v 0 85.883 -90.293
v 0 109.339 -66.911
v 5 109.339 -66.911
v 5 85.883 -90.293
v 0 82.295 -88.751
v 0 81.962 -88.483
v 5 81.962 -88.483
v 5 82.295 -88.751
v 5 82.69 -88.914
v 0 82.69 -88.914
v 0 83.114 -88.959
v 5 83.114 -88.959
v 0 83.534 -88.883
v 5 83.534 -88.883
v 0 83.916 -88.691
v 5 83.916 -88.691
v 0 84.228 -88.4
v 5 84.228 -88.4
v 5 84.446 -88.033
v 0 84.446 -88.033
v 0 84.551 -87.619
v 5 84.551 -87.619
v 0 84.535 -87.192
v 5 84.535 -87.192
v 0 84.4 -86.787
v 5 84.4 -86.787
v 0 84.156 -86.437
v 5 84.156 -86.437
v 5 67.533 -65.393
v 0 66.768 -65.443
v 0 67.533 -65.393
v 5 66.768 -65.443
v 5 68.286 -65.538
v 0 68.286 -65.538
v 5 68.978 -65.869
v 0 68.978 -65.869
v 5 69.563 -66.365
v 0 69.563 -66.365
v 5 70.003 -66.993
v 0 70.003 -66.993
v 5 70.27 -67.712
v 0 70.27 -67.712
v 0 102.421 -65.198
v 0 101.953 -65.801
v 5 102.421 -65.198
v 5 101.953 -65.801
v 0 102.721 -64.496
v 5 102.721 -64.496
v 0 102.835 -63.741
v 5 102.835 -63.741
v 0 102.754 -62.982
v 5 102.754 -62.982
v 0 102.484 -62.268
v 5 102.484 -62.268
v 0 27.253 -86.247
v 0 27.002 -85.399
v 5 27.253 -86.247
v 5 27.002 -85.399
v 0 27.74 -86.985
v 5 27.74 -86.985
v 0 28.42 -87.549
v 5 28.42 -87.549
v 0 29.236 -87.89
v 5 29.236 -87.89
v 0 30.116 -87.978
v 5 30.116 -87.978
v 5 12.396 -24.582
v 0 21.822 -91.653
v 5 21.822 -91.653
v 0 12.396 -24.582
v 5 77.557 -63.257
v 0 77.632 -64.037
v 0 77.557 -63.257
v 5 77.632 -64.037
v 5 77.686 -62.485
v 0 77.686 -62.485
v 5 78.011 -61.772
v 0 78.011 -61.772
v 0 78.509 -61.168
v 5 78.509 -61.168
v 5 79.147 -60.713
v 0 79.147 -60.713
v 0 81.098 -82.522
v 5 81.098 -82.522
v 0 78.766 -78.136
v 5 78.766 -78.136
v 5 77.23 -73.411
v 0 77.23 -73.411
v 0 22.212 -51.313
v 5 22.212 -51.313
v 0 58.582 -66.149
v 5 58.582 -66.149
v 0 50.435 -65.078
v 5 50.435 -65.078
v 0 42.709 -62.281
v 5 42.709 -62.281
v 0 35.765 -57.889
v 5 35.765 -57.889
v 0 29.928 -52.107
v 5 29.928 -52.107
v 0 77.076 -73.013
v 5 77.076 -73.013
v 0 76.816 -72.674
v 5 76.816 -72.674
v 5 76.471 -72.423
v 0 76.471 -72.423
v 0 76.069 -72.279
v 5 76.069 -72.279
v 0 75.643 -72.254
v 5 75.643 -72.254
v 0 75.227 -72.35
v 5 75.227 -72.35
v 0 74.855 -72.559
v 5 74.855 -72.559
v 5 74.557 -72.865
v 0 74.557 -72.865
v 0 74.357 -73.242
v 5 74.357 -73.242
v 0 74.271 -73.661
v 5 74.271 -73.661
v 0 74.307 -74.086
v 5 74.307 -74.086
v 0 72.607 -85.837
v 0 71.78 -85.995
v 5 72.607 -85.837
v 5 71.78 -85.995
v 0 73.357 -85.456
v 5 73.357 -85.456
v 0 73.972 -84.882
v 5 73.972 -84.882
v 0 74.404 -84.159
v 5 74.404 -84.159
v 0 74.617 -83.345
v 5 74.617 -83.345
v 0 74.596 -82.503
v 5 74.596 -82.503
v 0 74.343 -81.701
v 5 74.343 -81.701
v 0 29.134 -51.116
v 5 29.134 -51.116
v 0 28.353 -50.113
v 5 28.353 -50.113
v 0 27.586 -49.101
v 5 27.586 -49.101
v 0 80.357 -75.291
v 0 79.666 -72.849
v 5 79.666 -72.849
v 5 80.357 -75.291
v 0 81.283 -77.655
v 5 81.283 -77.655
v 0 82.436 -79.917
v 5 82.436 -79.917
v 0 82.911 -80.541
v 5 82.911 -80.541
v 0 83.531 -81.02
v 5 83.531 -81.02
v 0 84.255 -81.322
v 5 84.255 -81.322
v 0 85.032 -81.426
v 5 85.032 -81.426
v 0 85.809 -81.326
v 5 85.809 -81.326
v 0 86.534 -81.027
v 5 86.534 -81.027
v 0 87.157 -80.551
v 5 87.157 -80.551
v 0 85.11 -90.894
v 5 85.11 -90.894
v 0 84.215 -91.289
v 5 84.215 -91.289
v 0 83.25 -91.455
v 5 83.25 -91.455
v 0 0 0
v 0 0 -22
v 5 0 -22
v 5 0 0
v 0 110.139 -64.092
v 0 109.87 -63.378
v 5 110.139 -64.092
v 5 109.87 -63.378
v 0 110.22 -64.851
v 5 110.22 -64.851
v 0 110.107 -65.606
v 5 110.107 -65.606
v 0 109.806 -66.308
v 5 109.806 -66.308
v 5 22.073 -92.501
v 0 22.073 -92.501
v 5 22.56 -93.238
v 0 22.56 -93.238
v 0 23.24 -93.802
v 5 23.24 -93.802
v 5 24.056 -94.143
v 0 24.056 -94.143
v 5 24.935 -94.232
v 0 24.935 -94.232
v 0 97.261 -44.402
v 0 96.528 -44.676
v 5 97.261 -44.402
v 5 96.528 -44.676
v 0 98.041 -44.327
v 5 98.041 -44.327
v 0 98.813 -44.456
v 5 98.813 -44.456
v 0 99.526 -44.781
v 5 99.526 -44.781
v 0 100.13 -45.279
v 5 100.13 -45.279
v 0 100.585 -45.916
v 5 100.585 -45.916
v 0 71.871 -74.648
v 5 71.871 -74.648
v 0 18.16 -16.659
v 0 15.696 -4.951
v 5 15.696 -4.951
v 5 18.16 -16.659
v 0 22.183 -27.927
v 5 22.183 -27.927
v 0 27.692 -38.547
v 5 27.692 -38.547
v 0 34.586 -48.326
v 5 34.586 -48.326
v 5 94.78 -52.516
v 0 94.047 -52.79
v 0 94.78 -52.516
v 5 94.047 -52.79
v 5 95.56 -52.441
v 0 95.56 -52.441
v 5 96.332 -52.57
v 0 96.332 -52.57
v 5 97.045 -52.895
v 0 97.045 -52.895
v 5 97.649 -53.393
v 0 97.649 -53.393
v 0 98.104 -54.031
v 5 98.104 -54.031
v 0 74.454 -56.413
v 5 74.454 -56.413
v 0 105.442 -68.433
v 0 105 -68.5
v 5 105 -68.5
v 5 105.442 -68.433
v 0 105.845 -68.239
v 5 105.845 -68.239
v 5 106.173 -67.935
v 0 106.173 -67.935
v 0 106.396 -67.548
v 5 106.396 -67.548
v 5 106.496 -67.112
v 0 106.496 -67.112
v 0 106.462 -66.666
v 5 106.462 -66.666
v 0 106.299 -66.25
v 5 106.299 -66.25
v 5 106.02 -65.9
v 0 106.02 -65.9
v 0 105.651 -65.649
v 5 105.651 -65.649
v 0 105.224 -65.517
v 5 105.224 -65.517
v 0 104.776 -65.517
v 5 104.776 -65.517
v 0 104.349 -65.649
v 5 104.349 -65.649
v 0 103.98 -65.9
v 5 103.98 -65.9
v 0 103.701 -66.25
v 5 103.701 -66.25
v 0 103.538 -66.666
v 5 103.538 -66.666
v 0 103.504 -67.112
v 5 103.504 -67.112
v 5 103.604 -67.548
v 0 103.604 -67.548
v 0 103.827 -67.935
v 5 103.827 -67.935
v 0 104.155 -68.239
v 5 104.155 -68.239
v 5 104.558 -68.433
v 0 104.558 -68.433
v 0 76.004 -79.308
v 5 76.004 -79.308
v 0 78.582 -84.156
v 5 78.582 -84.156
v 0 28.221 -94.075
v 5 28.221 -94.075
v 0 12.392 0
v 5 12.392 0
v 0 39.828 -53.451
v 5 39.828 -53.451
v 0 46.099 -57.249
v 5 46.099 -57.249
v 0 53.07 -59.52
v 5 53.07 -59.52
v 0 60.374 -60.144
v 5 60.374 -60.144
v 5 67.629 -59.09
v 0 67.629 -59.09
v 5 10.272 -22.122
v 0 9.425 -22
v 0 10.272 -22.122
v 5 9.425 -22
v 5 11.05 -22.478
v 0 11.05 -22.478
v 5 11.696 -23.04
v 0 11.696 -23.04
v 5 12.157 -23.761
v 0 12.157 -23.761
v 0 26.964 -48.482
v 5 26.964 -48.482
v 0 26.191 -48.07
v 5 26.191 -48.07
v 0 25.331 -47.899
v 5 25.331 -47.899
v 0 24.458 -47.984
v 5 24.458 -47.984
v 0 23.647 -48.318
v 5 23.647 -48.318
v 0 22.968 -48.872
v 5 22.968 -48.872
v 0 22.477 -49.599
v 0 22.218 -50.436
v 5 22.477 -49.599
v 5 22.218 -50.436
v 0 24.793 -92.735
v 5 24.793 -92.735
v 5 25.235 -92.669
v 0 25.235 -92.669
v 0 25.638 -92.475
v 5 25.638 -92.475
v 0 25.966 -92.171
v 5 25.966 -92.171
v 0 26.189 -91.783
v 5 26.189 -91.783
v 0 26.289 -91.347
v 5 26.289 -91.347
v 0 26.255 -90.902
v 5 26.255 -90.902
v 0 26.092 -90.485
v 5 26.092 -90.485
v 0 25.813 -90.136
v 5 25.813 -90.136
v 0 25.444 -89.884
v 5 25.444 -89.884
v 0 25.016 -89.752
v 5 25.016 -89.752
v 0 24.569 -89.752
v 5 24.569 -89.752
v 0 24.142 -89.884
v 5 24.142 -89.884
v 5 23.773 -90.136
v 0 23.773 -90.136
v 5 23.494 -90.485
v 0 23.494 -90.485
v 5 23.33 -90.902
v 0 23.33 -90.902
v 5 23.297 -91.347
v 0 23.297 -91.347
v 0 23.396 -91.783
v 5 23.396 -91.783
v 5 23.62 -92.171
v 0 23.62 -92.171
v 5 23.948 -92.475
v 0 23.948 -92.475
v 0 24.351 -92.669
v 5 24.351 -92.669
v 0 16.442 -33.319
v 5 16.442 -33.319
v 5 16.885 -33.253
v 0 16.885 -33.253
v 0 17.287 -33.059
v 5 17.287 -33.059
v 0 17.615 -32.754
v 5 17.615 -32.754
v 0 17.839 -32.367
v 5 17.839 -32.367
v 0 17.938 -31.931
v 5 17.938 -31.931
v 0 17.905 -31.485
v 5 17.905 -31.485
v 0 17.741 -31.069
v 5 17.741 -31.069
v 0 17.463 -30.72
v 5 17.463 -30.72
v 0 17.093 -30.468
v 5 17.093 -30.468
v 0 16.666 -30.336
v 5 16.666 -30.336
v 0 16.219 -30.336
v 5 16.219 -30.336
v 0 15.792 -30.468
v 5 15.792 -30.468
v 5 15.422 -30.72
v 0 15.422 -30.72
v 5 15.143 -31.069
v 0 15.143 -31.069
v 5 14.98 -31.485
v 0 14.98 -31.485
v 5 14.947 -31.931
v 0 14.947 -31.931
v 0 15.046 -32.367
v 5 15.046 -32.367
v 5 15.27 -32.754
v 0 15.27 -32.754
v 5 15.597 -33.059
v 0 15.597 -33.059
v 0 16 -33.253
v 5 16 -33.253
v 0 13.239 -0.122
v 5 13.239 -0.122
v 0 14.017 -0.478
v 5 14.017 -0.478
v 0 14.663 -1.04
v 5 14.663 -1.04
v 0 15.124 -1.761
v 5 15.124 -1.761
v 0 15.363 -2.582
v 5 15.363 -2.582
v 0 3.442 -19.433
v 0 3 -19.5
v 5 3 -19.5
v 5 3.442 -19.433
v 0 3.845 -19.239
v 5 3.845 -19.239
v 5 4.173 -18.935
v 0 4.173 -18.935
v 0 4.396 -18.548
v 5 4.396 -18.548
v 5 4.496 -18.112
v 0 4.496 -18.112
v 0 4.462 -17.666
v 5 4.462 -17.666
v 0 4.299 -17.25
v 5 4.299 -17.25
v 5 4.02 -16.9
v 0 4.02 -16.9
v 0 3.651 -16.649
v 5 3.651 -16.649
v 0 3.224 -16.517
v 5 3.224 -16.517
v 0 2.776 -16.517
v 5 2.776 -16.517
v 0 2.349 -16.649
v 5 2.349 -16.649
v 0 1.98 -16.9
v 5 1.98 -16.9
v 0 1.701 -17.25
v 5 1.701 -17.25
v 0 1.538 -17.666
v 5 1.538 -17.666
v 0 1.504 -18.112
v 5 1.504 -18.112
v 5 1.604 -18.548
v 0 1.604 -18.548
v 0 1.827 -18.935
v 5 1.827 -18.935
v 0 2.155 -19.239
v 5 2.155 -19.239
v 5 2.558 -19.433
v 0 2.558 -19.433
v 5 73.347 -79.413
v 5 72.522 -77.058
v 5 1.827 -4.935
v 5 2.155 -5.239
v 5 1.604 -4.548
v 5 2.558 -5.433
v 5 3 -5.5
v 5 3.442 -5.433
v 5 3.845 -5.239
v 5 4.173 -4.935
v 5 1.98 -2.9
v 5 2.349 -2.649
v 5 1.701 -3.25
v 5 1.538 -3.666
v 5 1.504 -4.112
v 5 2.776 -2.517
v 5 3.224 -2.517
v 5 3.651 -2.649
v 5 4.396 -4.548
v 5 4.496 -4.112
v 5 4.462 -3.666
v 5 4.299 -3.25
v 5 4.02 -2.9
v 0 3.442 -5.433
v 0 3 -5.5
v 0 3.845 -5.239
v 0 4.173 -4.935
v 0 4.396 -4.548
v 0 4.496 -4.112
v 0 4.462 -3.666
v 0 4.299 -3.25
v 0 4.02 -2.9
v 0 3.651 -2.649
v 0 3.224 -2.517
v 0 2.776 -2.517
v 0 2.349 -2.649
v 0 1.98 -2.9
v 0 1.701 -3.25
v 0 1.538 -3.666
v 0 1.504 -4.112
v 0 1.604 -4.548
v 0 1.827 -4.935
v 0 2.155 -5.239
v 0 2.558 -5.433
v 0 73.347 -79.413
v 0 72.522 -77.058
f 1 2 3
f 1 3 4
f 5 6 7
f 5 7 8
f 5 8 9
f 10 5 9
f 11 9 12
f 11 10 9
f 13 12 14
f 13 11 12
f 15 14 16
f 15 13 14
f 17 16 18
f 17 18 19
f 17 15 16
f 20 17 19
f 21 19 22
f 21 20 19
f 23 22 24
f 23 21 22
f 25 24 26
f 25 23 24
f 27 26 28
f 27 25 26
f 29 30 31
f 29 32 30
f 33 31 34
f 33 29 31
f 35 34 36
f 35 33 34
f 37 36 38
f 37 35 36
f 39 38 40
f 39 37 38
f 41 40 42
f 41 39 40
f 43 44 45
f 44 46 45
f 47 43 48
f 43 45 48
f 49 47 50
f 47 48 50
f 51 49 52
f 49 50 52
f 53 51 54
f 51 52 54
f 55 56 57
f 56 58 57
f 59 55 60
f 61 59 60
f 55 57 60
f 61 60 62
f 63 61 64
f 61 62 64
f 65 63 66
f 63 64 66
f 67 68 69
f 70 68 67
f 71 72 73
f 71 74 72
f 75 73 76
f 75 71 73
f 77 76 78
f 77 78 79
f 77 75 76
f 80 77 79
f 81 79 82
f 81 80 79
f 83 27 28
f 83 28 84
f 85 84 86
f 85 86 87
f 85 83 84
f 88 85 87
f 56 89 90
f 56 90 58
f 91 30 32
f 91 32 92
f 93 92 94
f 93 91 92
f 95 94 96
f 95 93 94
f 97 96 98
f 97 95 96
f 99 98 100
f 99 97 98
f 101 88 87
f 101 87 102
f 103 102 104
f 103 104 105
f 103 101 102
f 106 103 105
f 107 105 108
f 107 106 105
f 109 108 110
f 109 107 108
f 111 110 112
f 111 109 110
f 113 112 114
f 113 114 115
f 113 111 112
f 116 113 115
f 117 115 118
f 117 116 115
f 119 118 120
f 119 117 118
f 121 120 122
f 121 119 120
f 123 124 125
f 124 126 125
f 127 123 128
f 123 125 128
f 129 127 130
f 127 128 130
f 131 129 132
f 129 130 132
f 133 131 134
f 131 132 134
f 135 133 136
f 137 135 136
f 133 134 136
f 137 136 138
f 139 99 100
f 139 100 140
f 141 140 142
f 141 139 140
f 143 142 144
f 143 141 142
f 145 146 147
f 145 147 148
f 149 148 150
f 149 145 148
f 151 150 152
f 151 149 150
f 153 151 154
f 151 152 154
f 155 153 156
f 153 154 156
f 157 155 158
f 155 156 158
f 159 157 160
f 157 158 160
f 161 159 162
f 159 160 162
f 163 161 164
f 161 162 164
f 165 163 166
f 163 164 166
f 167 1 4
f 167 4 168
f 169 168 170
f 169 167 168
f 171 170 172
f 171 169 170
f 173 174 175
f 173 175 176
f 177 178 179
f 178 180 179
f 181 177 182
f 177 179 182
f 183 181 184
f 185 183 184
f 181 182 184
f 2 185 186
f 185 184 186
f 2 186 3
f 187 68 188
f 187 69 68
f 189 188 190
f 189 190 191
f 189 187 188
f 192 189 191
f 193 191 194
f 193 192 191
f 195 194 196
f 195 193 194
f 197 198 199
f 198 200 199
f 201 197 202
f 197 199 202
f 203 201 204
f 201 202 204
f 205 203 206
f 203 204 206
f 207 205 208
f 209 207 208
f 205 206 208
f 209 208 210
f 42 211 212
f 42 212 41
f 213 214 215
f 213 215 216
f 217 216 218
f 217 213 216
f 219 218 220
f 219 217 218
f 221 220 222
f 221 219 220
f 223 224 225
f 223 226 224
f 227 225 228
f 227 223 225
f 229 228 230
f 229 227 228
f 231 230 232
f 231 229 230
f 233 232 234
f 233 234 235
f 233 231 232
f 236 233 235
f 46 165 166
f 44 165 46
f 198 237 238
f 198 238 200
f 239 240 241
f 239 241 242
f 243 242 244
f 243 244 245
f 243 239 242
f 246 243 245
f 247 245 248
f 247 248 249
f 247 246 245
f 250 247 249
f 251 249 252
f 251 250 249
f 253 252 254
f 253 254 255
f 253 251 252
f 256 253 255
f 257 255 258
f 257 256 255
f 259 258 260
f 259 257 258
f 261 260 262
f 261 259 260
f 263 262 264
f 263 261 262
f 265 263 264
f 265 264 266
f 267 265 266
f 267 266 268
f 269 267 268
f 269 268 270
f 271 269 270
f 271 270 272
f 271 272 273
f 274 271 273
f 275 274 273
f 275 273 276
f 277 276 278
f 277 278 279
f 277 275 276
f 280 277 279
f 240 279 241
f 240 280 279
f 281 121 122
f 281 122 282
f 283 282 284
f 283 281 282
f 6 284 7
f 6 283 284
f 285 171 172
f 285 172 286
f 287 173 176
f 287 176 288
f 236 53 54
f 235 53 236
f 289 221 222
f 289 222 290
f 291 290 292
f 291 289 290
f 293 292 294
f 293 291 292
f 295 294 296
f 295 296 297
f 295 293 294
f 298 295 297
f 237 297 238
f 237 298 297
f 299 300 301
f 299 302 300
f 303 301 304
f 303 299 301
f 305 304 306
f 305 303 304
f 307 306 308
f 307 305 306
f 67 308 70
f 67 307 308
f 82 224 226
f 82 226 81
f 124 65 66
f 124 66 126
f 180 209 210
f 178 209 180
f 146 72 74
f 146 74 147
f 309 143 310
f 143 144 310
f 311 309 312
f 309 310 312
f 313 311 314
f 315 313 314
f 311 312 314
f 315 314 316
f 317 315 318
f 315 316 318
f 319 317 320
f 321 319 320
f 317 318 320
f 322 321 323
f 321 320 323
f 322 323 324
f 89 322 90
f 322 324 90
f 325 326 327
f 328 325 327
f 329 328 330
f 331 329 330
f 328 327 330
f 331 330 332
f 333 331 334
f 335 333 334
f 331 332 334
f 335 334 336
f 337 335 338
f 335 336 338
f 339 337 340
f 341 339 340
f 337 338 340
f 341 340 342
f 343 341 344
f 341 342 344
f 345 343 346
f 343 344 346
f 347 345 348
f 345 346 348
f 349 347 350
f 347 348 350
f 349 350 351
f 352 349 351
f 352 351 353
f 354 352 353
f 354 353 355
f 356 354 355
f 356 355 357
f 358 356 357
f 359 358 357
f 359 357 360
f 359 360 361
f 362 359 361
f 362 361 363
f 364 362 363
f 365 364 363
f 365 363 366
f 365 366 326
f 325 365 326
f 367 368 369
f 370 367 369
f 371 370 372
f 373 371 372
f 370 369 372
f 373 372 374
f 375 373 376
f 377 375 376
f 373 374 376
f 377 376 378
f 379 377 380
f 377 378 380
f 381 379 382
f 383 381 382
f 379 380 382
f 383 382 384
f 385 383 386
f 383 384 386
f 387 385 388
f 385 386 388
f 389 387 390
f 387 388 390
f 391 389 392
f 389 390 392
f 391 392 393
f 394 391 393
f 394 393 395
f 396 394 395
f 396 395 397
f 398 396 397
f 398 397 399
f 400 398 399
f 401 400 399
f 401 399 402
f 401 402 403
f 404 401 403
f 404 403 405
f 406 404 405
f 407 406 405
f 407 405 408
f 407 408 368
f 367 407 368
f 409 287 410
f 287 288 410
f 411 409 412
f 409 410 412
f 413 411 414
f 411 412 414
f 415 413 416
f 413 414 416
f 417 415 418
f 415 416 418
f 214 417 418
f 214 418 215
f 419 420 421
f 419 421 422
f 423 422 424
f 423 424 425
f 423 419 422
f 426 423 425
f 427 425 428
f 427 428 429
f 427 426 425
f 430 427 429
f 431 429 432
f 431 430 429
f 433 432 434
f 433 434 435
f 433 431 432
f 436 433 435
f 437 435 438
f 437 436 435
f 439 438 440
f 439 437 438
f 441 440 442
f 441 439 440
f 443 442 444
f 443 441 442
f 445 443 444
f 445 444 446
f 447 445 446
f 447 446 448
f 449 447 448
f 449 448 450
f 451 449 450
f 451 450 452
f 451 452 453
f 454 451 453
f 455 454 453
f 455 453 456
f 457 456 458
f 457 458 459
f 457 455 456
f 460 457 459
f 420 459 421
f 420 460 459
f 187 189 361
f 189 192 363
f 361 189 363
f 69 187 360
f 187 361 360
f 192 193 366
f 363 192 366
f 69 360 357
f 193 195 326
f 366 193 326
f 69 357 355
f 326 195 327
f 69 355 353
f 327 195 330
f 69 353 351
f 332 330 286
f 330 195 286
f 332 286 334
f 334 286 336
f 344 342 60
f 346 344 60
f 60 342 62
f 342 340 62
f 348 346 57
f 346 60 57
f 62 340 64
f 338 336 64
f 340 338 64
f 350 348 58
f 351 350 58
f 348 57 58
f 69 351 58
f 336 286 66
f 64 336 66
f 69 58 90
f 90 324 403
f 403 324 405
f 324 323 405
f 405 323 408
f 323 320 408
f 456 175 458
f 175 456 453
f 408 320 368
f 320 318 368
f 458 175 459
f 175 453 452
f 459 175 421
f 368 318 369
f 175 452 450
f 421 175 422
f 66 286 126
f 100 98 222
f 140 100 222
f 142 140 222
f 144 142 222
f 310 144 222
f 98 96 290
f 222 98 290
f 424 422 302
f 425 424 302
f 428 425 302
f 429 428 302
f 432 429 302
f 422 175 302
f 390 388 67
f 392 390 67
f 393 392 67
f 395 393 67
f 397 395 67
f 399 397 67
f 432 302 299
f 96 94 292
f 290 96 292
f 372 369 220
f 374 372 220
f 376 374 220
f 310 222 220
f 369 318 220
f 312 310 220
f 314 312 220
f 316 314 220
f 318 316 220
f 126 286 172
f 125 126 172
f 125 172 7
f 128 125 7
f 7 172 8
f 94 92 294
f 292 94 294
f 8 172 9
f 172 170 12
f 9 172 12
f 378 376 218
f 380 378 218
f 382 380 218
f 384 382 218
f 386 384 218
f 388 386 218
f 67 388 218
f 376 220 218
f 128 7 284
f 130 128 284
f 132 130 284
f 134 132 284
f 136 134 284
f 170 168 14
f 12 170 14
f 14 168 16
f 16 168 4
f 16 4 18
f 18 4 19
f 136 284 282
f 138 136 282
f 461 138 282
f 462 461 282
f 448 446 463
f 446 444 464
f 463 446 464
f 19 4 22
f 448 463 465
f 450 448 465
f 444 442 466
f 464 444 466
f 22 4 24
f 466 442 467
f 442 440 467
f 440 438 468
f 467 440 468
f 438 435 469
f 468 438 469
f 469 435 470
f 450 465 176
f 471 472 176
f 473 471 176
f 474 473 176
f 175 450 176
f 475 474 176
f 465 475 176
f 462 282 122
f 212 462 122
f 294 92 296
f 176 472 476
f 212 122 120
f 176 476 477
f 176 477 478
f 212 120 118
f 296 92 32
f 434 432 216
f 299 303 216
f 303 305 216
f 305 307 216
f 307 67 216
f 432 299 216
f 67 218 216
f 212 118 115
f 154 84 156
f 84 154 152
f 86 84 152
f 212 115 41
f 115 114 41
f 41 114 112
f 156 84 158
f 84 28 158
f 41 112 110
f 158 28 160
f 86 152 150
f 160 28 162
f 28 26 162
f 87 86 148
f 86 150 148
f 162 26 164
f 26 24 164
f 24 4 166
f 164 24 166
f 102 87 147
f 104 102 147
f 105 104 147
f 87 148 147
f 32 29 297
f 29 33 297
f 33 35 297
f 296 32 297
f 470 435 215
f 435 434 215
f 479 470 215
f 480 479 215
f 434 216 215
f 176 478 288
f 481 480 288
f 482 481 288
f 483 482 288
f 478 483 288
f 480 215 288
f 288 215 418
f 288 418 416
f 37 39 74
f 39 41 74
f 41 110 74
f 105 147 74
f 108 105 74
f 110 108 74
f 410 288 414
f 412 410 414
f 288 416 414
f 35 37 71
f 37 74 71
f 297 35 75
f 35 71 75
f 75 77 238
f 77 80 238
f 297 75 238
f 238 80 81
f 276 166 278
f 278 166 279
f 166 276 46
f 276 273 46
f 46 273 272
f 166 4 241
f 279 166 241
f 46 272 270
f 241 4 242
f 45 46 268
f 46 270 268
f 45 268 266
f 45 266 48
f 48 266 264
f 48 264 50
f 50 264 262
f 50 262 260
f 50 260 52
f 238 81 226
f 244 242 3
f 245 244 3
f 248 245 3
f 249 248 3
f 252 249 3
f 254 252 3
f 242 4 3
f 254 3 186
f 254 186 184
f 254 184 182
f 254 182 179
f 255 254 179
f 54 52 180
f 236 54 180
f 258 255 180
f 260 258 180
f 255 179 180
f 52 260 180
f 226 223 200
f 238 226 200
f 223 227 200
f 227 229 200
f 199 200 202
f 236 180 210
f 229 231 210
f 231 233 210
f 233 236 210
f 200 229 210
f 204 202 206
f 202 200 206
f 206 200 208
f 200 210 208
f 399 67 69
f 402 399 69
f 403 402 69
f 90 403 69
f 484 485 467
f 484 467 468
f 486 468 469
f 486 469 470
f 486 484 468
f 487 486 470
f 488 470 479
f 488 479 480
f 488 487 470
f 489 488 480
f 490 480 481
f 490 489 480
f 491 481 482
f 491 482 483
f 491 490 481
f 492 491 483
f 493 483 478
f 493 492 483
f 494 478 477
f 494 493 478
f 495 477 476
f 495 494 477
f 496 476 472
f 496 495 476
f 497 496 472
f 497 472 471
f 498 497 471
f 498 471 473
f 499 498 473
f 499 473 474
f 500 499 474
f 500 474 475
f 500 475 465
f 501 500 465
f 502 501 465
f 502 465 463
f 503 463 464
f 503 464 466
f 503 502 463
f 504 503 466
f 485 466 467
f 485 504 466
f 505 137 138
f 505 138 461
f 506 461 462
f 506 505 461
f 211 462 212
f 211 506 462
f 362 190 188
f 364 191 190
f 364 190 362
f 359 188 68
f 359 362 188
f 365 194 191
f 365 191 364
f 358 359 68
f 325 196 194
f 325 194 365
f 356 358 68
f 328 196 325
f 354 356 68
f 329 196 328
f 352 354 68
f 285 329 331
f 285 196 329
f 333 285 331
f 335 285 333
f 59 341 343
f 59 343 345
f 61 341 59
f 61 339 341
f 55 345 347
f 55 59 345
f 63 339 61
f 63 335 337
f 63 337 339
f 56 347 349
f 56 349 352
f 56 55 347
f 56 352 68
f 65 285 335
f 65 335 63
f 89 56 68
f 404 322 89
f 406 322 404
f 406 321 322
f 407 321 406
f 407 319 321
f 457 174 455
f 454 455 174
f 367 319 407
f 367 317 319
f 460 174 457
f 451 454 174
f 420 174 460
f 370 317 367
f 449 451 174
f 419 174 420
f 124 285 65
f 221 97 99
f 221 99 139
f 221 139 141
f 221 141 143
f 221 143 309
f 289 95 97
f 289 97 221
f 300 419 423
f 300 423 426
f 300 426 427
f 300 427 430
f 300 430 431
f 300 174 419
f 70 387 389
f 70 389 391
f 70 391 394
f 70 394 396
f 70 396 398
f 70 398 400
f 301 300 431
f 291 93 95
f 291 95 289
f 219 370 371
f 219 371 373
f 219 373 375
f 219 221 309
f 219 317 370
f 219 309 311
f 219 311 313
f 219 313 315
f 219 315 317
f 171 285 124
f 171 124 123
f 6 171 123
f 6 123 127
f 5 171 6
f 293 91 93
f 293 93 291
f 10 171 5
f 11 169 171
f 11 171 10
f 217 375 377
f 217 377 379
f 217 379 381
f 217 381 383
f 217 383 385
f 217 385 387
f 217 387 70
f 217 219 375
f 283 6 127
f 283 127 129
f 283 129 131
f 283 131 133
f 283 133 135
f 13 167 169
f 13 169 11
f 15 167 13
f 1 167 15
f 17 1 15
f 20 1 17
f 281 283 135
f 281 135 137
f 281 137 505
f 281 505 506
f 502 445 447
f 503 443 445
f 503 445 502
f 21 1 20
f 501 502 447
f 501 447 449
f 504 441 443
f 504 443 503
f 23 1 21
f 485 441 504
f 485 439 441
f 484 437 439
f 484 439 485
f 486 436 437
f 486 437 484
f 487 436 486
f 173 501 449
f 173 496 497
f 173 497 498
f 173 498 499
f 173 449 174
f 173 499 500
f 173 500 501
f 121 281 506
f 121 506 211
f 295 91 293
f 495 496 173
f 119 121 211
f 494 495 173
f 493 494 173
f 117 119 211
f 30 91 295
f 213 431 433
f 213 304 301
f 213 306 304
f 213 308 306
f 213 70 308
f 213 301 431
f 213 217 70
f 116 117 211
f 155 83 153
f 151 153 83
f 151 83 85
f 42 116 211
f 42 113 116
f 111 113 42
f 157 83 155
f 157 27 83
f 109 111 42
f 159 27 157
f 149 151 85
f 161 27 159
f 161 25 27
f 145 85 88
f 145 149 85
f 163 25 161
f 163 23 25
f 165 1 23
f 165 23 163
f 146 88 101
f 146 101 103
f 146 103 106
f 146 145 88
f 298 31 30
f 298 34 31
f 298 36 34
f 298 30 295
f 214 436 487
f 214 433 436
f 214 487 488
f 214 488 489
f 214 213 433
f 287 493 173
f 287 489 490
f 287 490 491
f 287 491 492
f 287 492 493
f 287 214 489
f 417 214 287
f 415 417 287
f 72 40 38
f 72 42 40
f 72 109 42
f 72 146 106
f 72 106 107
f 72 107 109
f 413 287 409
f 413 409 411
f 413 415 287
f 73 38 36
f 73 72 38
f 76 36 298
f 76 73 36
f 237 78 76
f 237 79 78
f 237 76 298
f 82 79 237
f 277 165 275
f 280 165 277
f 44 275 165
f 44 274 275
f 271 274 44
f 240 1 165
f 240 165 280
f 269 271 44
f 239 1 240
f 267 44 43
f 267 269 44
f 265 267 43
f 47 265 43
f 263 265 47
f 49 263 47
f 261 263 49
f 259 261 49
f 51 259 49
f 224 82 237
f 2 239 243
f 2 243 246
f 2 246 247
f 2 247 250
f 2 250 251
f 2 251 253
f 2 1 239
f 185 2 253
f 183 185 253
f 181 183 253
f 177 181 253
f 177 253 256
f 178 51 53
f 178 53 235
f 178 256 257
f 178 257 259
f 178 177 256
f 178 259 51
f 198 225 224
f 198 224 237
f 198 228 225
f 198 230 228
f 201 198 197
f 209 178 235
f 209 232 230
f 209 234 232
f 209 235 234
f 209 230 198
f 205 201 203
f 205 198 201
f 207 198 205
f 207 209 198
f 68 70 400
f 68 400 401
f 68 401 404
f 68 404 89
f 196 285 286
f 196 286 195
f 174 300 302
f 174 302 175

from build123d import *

# Parameters (mm, degrees)
SKETCH1_R           = 1.5
BOSS_EXTRUDE1_DEPTH = 5
FILLET1_R           = 3
CUT_EXTRUDE2_REACH  = 7
SKETCH7_R           = 1.5


with BuildPart() as part:
    # Sketch1 → Boss-Extrude1 (new body)
    with BuildSketch(Plane(origin=(0, 0, 0), x_dir=(0, 0, -1), z_dir=(1, 0, 0))):
        with BuildLine():
            Line((0, 0), (0, 15))
            Line((0, 15), (4.951340344, 15.695865505))
            ThreePointArc((4.951340344, 15.695865505), (27.926864621, 22.182944056), (48.325875811, 34.586058439))
            ThreePointArc((48.325875811, 34.586058439), (59.519665724, 53.069681974), (56.412643103, 74.454061366))
            Line((56.412643103, 74.454061366), (43.267439345, 99.176593966))
            Line((43.267439345, 99.176593966), (65.341129166, 110.913383036))
            Line((65.341129166, 110.913383036), (90.292806812, 85.883380245))
            ThreePointArc((90.292806812, 85.883380245), (91.119279883, 84.674725039), (91.455424552, 83.249624372))
            Line((91.455424552, 83.249624372), (94.07546653, 28.221444591))
            Line((94.07546653, 28.221444591), (94.36203286, 22.202753427))
            Line((94.36203286, 22.202753427), (22, 12.032932928))
            Line((22, 12.032932928), (22, 0))
            Line((22, 0), (0, 0))
        make_face()
        with Locations((4, 3)):
            Circle(SKETCH1_R, mode=Mode.SUBTRACT)
        with Locations((18, 3)):
            Circle(SKETCH1_R, mode=Mode.SUBTRACT)
        with Locations((67, 105)):
            Circle(SKETCH1_R, mode=Mode.SUBTRACT)
        with BuildLine():
            Line((37.734060935, 20.303176421), (88.108596969, 27.382855762))
            Line((88.108596969, 27.382855762), (85.763043155, 76.646019476))
            ThreePointArc((85.763043155, 76.646019476), (80.419740702, 73.76043279), (74.648335848, 71.871417797))
            Line((74.648335848, 71.871417797), (64.774649495, 69.591897689))
            ThreePointArc((64.774649495, 69.591897689), (64.35710923, 47.870362906), (52.107292501, 29.927637267))
            ThreePointArc((52.107292501, 29.927637267), (45.141760841, 24.785238396), (37.734060935, 20.303176421))
        make_face(mode=Mode.SUBTRACT)
        with BuildLine():
            Line((83.108700039, 84.591428686), (64.231449963, 103.527935833))
            Line((64.231449963, 103.527935833), (51.381954278, 96.695737786))
            Line((51.381954278, 96.695737786), (61.793684809, 77.114120627))
            Line((61.793684809, 77.114120627), (72.848727413, 79.666378316))
            ThreePointArc((72.848727413, 79.666378316), (78.251497028, 81.560635362), (83.108700039, 84.591428686))
        make_face(mode=Mode.SUBTRACT)
        with BuildLine():
            ThreePointArc((74.085958212, 74.307342959), (81.788354228, 77.187150825), (88.482948342, 81.962358399))
            ThreePointArc((88.482948342, 81.962358399), (88.556981354, 84.082386492), (86.436953262, 84.156419504))
            ThreePointArc((86.436953262, 84.156419504), (80.379939539, 79.835993604), (73.411105049, 77.230453154))
            ThreePointArc((73.411105049, 77.230453154), (72.286976533, 75.431471475), (74.085958212, 74.307342959))
        make_face(mode=Mode.SUBTRACT)
    extrude(amount=BOSS_EXTRUDE1_DEPTH)

    # Fillet1
    fillet1_edges = [part.edges().sort_by_distance(p)[0] for p in [
        (2.5, 15, 0),
        (2.5, 99.176593966, -43.267439345),
        (2.5, 110.913383036, -65.341129166),
        (2.5, 22.202753427, -94.36203286),
        (2.5, 12.032932928, -22),
        (2.5, 20.303176421, -37.734060935),
        (2.5, 27.382855762, -88.108596969),
        (2.5, 76.646019476, -85.763043155),
        (2.5, 69.591897689, -64.774649495),
        (2.5, 84.591428686, -83.108700039),
        (2.5, 103.527935833, -64.231449963),
        (2.5, 96.695737786, -51.381954278),
        (2.5, 77.114120627, -61.793684809),
    ]]
    fillet(fillet1_edges, radius=FILLET1_R)

    # Sketch7 → Cut-Extrude2 (cut, up to next)
    with BuildSketch(Plane(origin=(5, 0, 0), x_dir=(0, 0, -1), z_dir=(1, 0, 0)), mode=Mode.PRIVATE) as cut_extrude2_sk1:
        with Locations((31.81923079, 16.442418537)):
            Circle(SKETCH7_R)
    cut_extrude2_tool1 = extrude(cut_extrude2_sk1.sketch, amount=-CUT_EXTRUDE2_REACH, mode=Mode.PRIVATE) & part.part
    add(cut_extrude2_tool1.solids().sort_by_distance((5, 16.442419, -31.819231))[0], mode=Mode.SUBTRACT)
    # Sketch7 → Cut-Extrude2 (cut, up to next)
    with BuildSketch(Plane(origin=(5, 0, 0), x_dir=(0, 0, -1), z_dir=(1, 0, 0)), mode=Mode.PRIVATE) as cut_extrude2_sk2:
        with Locations((91.235314915, 24.792804595)):
            Circle(SKETCH7_R)
    cut_extrude2_tool2 = extrude(cut_extrude2_sk2.sketch, amount=-CUT_EXTRUDE2_REACH, mode=Mode.PRIVATE) & part.part
    add(cut_extrude2_tool2.solids().sort_by_distance((5, 24.792805, -91.235315))[0], mode=Mode.SUBTRACT)


solid = part.part
